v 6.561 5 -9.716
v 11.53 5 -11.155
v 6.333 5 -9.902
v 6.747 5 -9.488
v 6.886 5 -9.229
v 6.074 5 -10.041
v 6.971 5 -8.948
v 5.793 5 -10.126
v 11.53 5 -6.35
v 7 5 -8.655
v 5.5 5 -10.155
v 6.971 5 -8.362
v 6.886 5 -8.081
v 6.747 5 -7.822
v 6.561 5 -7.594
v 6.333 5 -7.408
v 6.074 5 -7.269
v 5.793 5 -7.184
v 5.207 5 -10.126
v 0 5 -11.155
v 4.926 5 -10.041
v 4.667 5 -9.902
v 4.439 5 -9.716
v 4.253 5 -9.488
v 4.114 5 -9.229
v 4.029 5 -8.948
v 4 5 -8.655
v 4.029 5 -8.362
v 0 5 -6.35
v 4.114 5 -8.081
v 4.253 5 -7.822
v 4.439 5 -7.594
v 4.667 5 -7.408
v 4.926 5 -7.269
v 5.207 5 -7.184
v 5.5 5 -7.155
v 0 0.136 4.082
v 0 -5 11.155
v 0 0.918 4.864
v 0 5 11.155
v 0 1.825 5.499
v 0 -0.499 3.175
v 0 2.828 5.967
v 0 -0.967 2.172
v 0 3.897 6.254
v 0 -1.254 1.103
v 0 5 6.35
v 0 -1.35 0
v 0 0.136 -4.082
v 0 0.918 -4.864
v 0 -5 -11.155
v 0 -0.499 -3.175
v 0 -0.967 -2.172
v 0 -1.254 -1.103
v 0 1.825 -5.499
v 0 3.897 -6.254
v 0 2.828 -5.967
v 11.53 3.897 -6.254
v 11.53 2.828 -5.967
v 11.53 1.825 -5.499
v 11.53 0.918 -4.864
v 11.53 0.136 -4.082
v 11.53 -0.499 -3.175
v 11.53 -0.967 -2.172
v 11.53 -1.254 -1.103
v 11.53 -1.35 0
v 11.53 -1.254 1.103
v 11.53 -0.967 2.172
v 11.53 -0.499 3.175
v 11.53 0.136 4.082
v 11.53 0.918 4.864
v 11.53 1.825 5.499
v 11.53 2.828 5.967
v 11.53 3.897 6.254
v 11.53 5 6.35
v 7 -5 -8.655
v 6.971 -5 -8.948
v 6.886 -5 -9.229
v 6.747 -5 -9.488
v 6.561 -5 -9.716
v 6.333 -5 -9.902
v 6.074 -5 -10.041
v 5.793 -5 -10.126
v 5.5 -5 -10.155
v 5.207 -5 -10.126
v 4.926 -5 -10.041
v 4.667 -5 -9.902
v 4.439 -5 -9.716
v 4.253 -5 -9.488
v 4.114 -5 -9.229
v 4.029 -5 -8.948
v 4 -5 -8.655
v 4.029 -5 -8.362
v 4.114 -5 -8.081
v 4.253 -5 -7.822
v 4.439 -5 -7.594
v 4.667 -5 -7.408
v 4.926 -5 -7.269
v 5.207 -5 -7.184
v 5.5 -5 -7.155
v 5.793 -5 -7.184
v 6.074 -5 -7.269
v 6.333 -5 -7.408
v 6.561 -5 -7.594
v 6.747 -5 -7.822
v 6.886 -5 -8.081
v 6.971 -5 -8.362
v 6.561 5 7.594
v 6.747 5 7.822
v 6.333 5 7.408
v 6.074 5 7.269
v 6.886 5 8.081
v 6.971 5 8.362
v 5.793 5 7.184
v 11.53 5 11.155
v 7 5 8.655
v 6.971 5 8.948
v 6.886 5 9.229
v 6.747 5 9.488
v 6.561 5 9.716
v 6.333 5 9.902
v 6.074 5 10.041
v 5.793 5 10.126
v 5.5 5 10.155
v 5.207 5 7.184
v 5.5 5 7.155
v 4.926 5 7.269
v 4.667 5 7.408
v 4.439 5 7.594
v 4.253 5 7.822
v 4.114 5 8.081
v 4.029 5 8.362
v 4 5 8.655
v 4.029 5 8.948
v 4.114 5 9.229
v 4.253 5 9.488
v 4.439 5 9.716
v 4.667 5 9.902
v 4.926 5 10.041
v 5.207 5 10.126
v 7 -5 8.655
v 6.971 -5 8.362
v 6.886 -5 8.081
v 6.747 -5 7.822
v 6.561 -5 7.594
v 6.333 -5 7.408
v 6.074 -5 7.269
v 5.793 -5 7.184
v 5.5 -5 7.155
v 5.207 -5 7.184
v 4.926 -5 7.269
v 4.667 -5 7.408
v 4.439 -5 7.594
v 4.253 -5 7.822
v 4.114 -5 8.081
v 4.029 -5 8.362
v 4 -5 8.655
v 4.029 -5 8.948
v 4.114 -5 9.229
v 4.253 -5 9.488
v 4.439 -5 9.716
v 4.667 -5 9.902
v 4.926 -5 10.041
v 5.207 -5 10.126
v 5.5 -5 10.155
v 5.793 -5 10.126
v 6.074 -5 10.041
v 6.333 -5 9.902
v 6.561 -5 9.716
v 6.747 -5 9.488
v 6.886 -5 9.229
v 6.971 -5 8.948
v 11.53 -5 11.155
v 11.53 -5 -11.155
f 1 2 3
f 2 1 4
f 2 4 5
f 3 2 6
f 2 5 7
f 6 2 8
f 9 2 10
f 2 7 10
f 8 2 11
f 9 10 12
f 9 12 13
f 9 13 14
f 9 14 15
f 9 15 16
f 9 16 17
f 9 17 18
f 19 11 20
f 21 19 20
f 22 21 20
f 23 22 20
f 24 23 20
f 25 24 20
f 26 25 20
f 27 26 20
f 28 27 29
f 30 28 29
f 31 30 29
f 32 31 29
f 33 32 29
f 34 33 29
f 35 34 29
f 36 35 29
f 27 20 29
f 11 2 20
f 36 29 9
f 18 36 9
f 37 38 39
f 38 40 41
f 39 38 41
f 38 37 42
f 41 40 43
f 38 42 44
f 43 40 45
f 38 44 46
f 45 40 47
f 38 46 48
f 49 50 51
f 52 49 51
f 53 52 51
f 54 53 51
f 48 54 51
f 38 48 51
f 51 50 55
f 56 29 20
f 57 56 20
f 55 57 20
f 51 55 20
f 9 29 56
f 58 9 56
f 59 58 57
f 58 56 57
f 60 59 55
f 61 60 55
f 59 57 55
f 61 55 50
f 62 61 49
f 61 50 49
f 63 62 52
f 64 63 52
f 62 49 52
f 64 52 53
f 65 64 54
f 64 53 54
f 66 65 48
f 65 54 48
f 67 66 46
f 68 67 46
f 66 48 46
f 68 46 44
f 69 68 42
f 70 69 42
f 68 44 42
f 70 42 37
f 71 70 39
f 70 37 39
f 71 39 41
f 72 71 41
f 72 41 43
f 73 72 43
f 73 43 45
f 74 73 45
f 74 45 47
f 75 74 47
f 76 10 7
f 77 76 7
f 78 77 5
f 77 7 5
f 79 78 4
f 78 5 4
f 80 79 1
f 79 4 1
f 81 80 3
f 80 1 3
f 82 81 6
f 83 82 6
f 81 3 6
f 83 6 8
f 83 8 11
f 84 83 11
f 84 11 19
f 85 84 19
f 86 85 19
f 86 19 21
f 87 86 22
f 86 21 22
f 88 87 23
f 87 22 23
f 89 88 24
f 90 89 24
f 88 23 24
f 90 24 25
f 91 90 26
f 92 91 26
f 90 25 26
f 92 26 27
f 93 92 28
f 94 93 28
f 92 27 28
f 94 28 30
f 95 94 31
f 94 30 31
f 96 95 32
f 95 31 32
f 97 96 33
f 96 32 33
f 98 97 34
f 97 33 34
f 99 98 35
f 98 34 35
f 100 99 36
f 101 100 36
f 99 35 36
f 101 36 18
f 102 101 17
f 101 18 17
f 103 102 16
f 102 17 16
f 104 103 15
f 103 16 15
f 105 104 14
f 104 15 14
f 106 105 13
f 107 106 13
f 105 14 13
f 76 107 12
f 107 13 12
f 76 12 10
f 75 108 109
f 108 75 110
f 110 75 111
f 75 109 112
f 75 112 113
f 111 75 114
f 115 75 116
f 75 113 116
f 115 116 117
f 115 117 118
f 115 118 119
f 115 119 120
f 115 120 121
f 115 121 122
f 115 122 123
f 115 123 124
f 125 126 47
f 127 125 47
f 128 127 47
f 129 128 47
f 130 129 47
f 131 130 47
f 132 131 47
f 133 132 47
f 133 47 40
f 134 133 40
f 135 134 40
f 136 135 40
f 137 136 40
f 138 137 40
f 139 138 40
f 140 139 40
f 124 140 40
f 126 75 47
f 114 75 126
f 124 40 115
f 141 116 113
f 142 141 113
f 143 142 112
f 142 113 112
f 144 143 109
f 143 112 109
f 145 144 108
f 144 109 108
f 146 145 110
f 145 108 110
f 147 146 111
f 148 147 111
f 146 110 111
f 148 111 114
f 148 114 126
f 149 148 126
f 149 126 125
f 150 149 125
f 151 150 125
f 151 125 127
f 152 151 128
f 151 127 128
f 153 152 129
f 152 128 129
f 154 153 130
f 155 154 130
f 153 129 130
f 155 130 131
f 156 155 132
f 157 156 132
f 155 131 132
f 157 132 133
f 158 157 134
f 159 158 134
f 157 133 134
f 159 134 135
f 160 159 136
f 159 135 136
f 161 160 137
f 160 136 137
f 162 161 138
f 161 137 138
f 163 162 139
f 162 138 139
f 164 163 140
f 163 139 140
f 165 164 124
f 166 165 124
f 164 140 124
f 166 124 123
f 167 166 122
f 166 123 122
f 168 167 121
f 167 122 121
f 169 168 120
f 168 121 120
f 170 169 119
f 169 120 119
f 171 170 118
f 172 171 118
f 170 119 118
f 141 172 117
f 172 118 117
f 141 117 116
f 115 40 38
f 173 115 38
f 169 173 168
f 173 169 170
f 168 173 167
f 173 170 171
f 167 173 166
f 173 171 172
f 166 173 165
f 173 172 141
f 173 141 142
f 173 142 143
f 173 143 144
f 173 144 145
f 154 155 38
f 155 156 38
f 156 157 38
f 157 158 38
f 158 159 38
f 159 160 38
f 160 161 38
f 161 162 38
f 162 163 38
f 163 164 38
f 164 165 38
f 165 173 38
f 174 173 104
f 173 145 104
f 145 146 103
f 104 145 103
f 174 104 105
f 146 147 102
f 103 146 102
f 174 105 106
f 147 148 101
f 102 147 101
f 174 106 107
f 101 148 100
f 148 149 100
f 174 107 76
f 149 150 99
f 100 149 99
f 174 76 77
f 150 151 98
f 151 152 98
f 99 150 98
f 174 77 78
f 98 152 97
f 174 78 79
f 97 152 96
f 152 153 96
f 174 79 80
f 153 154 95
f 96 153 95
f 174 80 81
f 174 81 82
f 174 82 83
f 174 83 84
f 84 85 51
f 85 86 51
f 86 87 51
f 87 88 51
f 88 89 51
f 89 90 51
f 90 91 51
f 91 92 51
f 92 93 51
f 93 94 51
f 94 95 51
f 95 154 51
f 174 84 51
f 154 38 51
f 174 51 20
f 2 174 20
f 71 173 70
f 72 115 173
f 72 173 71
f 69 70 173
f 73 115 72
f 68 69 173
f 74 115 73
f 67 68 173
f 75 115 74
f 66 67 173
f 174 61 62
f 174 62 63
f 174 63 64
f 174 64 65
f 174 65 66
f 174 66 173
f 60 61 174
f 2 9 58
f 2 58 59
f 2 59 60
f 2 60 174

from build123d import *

# Parameters (mm, degrees)
BOSS_EXTRUDE1_DEPTH = 11.53
SKETCH2_R           = 1.5
CUT_EXTRUDE1_DEPTH  = 10


with BuildPart() as part:
    # Sketch1 → Boss-Extrude1 (new body)
    with BuildSketch(Plane(origin=(0, 0, 0), x_dir=(0, 0, -1), z_dir=(1, 0, 0))):
        with BuildLine():
            Line((-6.35, 5), (-11.155, 5))
            Line((-11.155, 5), (-11.155, -5))
            Line((-11.155, -5), (-6.155, -5))
            Line((-6.155, -5), (6.155, -5))
            Line((6.155, -5), (11.155, -5))
            Line((11.155, -5), (11.155, 5))
            Line((11.155, 5), (6.35, 5))
            ThreePointArc((6.35, 5), (0, -1.35), (-6.35, 5))
        make_face()
    extrude(amount=BOSS_EXTRUDE1_DEPTH)

    # Sketch2 → Cut-Extrude1 (cut)
    with BuildSketch(Plane(origin=(0, 5, 0), x_dir=(1, 0, 0), z_dir=(0, 1, 0))):
        with Locations((5.5, -8.655)):
            Circle(SKETCH2_R)
        with Locations((5.5, 8.655)):
            Circle(SKETCH2_R)
    extrude(amount=-CUT_EXTRUDE1_DEPTH, mode=Mode.SUBTRACT)


solid = part.part
